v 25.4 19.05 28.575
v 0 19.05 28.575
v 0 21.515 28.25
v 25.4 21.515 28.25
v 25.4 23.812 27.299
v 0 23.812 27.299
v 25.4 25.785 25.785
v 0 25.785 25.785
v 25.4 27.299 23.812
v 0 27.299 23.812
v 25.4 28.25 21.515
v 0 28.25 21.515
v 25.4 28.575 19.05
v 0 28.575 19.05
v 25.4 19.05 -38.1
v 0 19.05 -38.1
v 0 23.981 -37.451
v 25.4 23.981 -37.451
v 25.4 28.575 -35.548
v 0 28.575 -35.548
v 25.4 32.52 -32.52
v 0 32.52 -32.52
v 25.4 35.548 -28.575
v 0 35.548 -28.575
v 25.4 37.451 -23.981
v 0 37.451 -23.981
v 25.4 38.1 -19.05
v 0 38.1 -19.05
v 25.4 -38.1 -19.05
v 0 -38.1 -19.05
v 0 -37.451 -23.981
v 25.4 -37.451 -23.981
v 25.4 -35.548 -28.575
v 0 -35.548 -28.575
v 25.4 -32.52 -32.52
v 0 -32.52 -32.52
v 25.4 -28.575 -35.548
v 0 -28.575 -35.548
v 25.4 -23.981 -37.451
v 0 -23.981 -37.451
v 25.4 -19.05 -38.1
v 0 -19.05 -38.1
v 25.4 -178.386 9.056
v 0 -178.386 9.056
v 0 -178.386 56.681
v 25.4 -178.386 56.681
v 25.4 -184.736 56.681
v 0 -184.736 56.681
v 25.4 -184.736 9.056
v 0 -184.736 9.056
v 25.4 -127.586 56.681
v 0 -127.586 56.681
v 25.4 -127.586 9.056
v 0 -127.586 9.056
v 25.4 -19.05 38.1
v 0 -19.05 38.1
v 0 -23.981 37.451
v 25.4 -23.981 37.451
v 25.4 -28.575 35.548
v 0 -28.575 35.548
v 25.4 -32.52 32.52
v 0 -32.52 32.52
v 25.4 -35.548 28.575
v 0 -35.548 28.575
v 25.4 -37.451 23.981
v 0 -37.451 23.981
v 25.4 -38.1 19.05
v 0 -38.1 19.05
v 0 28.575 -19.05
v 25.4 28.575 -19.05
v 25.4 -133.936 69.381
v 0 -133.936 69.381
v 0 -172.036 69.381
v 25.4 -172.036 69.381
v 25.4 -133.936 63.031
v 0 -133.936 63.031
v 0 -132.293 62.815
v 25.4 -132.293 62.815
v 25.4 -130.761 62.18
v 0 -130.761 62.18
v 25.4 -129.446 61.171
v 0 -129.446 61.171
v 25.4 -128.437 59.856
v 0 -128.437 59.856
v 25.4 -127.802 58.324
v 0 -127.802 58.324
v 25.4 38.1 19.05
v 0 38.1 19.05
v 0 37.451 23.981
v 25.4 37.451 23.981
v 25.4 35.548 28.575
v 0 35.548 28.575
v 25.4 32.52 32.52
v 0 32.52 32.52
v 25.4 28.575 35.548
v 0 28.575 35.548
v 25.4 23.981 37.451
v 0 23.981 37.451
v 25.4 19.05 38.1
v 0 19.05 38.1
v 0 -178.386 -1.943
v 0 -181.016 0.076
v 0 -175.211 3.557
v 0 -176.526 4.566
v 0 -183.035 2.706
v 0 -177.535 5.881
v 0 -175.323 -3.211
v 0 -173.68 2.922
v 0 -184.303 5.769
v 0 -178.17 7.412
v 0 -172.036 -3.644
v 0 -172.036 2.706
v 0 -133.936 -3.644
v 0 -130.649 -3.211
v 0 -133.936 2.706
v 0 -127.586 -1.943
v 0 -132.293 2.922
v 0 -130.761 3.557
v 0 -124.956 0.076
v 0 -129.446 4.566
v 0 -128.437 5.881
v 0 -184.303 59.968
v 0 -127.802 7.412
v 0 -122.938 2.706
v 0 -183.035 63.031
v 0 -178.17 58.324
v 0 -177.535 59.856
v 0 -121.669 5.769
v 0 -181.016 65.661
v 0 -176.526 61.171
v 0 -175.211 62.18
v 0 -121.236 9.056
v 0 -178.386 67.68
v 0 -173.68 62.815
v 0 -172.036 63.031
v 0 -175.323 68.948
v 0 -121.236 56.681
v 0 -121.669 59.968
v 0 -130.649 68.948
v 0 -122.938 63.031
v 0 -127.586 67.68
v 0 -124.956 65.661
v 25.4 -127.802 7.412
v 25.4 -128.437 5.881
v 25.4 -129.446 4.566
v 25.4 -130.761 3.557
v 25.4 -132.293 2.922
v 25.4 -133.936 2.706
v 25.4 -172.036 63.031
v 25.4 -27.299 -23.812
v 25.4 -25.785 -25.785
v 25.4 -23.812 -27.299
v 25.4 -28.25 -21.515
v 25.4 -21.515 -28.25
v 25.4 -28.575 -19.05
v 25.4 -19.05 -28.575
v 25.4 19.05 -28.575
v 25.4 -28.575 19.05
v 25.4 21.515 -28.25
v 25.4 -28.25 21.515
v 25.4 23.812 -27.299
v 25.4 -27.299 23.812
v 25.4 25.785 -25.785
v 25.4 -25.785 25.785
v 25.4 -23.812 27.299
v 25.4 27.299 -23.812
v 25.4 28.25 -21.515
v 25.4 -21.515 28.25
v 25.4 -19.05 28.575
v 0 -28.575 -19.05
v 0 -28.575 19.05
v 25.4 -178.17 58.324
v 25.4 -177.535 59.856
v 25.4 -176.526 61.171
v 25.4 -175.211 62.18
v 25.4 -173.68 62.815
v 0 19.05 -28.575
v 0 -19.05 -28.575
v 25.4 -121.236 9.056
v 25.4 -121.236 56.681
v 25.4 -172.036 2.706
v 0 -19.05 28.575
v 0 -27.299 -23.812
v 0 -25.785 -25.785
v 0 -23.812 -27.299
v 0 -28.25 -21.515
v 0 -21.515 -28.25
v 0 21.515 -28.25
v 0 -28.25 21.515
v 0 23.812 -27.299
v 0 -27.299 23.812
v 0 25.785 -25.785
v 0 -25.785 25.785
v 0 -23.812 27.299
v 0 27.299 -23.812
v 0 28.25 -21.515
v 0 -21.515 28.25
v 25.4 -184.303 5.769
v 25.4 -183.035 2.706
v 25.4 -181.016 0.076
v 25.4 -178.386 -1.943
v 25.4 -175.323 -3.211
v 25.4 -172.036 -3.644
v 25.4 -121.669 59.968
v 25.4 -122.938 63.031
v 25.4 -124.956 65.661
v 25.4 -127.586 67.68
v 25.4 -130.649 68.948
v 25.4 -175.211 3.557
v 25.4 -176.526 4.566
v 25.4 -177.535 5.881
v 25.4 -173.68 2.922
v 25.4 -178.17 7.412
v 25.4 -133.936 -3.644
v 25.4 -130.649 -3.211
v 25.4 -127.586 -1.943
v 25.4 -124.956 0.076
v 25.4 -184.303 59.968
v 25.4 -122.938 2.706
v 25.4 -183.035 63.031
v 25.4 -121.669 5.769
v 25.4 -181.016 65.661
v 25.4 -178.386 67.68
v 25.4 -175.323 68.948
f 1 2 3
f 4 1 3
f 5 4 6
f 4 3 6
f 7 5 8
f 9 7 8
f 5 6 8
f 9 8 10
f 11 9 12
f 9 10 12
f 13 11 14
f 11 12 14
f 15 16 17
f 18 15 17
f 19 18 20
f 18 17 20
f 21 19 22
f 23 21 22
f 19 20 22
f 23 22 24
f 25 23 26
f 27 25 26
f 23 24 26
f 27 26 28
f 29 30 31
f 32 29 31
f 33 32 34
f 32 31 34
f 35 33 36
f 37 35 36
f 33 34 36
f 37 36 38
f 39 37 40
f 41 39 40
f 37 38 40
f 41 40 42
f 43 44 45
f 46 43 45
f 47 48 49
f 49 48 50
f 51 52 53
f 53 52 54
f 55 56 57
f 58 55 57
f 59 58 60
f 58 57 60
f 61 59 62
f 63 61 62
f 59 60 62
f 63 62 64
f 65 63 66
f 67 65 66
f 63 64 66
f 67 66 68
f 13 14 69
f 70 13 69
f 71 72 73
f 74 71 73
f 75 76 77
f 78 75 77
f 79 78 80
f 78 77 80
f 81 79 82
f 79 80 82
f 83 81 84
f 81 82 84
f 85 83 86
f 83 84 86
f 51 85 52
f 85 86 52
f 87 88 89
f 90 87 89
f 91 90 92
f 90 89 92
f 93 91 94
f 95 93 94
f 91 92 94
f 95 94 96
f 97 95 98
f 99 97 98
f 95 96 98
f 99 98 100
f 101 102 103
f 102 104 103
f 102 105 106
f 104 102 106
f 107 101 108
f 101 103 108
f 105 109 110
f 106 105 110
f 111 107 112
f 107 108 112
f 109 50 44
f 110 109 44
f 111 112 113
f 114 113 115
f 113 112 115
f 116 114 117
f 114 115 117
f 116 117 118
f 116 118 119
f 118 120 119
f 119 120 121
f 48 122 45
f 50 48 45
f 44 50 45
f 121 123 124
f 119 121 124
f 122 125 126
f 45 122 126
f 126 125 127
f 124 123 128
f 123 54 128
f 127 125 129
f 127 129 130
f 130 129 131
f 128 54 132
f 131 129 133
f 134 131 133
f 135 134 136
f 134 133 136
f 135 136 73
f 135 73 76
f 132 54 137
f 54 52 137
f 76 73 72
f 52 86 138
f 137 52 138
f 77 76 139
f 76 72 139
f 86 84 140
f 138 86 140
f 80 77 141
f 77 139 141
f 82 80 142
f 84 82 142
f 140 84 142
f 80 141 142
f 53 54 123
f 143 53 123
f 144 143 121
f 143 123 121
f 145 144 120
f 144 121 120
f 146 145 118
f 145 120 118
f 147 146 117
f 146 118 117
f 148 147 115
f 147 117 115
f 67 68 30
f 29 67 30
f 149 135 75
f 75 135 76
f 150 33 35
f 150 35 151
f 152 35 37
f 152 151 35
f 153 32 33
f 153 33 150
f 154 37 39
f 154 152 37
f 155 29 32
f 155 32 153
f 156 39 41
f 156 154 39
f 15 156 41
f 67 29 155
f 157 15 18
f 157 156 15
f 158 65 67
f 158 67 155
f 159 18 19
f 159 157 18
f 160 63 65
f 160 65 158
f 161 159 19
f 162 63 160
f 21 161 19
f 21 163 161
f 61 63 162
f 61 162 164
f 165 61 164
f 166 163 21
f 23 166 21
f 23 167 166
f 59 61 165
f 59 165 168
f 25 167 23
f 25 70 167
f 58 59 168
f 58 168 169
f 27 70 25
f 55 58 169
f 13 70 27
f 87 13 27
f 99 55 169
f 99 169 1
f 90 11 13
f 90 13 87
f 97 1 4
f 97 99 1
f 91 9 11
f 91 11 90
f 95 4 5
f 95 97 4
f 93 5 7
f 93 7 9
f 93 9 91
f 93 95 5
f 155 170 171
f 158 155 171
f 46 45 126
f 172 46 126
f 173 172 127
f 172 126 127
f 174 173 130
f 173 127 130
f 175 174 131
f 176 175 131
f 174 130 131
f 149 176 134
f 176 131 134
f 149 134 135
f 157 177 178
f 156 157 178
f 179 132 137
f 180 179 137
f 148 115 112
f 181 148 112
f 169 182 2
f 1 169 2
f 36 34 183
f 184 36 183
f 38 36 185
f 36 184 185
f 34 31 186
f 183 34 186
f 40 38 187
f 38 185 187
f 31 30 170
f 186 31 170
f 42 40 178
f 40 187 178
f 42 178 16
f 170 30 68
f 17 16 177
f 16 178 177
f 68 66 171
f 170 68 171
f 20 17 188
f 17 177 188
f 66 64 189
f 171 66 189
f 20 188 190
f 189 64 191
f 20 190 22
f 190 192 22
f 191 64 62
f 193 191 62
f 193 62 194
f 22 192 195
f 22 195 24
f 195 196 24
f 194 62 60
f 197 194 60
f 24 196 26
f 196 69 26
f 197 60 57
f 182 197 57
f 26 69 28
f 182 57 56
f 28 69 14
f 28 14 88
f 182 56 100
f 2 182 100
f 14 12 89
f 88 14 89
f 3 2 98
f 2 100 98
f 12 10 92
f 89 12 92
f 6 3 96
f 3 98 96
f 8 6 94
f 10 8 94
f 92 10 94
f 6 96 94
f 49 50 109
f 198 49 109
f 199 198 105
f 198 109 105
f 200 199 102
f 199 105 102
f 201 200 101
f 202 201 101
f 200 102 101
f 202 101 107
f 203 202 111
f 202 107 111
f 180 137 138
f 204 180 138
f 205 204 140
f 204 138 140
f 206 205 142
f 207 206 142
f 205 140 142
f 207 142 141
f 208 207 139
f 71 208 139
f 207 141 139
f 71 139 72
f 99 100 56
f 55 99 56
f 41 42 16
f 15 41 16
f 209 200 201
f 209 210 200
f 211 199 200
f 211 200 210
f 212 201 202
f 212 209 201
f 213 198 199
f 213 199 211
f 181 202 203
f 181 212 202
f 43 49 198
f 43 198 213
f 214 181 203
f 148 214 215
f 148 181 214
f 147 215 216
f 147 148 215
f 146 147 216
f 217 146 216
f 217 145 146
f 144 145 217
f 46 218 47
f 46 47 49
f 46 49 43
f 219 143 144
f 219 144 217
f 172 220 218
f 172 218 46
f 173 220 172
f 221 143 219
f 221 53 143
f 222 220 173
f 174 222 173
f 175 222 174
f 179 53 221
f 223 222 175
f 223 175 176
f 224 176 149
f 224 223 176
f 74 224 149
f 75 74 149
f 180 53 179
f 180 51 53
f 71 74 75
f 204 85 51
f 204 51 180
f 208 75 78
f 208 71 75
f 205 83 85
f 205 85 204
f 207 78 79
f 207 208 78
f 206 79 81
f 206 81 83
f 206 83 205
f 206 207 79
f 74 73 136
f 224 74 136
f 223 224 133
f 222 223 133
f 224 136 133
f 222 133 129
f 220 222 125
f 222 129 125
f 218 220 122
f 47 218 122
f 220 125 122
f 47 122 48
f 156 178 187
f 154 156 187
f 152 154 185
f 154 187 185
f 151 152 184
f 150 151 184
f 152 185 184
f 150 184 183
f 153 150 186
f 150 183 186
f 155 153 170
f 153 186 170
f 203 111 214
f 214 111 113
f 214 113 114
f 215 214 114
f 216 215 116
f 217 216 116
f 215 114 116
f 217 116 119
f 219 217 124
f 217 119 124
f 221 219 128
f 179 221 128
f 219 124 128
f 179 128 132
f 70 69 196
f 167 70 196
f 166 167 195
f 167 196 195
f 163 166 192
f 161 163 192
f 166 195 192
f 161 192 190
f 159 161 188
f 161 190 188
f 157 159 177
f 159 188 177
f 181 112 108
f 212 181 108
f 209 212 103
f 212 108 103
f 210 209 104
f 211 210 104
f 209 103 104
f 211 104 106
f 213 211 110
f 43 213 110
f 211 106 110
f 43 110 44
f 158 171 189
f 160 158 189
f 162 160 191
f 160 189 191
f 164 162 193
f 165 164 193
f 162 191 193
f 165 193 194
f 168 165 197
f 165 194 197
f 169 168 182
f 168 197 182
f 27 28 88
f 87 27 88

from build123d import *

# Parameters (mm, degrees)
F1_DEPTH = 25.4
F3_DEPTH = 25.4


with BuildPart() as f1:
    # F0 (on Right) → F1 (new body)
    with BuildSketch(Plane.YZ):
        with BuildLine():
            Line((19.05, 38.1), (-19.05, 38.1))
            ThreePointArc((-19.05, 38.1), (-32.520384, 32.520384), (-38.1, 19.05))
            Line((-38.1, 19.05), (-38.1, -19.05))
            ThreePointArc((-38.1, -19.05), (-32.520384, -32.520384), (-19.05, -38.1))
            Line((-19.05, -38.1), (19.05, -38.1))
            ThreePointArc((19.05, -38.1), (32.520384, -32.520384), (38.1, -19.05))
            Line((38.1, -19.05), (38.1, 19.05))
            ThreePointArc((38.1, 19.05), (32.520384, 32.520384), (19.05, 38.1))
        make_face()
        with BuildLine():
            ThreePointArc((-28.575, 19.05), (-25.785192, 25.785192), (-19.05, 28.575))
            Line((-19.05, 28.575), (19.05, 28.575))
            ThreePointArc((19.05, 28.575), (25.785192, 25.785192), (28.575, 19.05))
            Line((28.575, 19.05), (28.575, -19.05))
            ThreePointArc((28.575, -19.05), (25.785192, -25.785192), (19.05, -28.575))
            Line((19.05, -28.575), (-19.05, -28.575))
            ThreePointArc((-19.05, -28.575), (-25.785192, -25.785192), (-28.575, -19.05))
            Line((-28.575, -19.05), (-28.575, 19.05))
        make_face(mode=Mode.SUBTRACT)
    extrude(amount=F1_DEPTH)


with BuildPart() as f3:
    # F2 (on Right) → F3 (new body)
    with BuildSketch(Plane.YZ):
        with BuildLine():
            Line((-133.936104, 69.380991), (-172.036104, 69.380991))
            ThreePointArc((-172.036104, 69.380991), (-181.01636, 65.661247), (-184.736104, 56.680991))
            Line((-184.736104, 56.680991), (-184.736104, 9.055991))
            ThreePointArc((-184.736104, 9.055991), (-181.01636, 0.075735), (-172.036104, -3.644009))
            Line((-172.036104, -3.644009), (-133.936104, -3.644009))
            ThreePointArc((-133.936104, -3.644009), (-124.955848, 0.075735), (-121.236104, 9.055991))
            Line((-121.236104, 9.055991), (-121.236104, 56.680991))
            ThreePointArc((-121.236104, 56.680991), (-124.955848, 65.661247), (-133.936104, 69.380991))
        make_face()
        with BuildLine():
            ThreePointArc((-178.386104, 56.680991), (-176.526232, 61.171119), (-172.036104, 63.030991))
            Line((-172.036104, 63.030991), (-133.936104, 63.030991))
            ThreePointArc((-133.936104, 63.030991), (-129.445976, 61.171119), (-127.586104, 56.680991))
            Line((-127.586104, 56.680991), (-127.586104, 9.055991))
            ThreePointArc((-127.586104, 9.055991), (-129.445976, 4.565863), (-133.936104, 2.705991))
            Line((-133.936104, 2.705991), (-172.036104, 2.705991))
            ThreePointArc((-172.036104, 2.705991), (-176.526232, 4.565863), (-178.386104, 9.055991))
            Line((-178.386104, 9.055991), (-178.386104, 56.680991))
        make_face(mode=Mode.SUBTRACT)
    extrude(amount=F3_DEPTH)


solid = Compound([f1.part, f3.part])
